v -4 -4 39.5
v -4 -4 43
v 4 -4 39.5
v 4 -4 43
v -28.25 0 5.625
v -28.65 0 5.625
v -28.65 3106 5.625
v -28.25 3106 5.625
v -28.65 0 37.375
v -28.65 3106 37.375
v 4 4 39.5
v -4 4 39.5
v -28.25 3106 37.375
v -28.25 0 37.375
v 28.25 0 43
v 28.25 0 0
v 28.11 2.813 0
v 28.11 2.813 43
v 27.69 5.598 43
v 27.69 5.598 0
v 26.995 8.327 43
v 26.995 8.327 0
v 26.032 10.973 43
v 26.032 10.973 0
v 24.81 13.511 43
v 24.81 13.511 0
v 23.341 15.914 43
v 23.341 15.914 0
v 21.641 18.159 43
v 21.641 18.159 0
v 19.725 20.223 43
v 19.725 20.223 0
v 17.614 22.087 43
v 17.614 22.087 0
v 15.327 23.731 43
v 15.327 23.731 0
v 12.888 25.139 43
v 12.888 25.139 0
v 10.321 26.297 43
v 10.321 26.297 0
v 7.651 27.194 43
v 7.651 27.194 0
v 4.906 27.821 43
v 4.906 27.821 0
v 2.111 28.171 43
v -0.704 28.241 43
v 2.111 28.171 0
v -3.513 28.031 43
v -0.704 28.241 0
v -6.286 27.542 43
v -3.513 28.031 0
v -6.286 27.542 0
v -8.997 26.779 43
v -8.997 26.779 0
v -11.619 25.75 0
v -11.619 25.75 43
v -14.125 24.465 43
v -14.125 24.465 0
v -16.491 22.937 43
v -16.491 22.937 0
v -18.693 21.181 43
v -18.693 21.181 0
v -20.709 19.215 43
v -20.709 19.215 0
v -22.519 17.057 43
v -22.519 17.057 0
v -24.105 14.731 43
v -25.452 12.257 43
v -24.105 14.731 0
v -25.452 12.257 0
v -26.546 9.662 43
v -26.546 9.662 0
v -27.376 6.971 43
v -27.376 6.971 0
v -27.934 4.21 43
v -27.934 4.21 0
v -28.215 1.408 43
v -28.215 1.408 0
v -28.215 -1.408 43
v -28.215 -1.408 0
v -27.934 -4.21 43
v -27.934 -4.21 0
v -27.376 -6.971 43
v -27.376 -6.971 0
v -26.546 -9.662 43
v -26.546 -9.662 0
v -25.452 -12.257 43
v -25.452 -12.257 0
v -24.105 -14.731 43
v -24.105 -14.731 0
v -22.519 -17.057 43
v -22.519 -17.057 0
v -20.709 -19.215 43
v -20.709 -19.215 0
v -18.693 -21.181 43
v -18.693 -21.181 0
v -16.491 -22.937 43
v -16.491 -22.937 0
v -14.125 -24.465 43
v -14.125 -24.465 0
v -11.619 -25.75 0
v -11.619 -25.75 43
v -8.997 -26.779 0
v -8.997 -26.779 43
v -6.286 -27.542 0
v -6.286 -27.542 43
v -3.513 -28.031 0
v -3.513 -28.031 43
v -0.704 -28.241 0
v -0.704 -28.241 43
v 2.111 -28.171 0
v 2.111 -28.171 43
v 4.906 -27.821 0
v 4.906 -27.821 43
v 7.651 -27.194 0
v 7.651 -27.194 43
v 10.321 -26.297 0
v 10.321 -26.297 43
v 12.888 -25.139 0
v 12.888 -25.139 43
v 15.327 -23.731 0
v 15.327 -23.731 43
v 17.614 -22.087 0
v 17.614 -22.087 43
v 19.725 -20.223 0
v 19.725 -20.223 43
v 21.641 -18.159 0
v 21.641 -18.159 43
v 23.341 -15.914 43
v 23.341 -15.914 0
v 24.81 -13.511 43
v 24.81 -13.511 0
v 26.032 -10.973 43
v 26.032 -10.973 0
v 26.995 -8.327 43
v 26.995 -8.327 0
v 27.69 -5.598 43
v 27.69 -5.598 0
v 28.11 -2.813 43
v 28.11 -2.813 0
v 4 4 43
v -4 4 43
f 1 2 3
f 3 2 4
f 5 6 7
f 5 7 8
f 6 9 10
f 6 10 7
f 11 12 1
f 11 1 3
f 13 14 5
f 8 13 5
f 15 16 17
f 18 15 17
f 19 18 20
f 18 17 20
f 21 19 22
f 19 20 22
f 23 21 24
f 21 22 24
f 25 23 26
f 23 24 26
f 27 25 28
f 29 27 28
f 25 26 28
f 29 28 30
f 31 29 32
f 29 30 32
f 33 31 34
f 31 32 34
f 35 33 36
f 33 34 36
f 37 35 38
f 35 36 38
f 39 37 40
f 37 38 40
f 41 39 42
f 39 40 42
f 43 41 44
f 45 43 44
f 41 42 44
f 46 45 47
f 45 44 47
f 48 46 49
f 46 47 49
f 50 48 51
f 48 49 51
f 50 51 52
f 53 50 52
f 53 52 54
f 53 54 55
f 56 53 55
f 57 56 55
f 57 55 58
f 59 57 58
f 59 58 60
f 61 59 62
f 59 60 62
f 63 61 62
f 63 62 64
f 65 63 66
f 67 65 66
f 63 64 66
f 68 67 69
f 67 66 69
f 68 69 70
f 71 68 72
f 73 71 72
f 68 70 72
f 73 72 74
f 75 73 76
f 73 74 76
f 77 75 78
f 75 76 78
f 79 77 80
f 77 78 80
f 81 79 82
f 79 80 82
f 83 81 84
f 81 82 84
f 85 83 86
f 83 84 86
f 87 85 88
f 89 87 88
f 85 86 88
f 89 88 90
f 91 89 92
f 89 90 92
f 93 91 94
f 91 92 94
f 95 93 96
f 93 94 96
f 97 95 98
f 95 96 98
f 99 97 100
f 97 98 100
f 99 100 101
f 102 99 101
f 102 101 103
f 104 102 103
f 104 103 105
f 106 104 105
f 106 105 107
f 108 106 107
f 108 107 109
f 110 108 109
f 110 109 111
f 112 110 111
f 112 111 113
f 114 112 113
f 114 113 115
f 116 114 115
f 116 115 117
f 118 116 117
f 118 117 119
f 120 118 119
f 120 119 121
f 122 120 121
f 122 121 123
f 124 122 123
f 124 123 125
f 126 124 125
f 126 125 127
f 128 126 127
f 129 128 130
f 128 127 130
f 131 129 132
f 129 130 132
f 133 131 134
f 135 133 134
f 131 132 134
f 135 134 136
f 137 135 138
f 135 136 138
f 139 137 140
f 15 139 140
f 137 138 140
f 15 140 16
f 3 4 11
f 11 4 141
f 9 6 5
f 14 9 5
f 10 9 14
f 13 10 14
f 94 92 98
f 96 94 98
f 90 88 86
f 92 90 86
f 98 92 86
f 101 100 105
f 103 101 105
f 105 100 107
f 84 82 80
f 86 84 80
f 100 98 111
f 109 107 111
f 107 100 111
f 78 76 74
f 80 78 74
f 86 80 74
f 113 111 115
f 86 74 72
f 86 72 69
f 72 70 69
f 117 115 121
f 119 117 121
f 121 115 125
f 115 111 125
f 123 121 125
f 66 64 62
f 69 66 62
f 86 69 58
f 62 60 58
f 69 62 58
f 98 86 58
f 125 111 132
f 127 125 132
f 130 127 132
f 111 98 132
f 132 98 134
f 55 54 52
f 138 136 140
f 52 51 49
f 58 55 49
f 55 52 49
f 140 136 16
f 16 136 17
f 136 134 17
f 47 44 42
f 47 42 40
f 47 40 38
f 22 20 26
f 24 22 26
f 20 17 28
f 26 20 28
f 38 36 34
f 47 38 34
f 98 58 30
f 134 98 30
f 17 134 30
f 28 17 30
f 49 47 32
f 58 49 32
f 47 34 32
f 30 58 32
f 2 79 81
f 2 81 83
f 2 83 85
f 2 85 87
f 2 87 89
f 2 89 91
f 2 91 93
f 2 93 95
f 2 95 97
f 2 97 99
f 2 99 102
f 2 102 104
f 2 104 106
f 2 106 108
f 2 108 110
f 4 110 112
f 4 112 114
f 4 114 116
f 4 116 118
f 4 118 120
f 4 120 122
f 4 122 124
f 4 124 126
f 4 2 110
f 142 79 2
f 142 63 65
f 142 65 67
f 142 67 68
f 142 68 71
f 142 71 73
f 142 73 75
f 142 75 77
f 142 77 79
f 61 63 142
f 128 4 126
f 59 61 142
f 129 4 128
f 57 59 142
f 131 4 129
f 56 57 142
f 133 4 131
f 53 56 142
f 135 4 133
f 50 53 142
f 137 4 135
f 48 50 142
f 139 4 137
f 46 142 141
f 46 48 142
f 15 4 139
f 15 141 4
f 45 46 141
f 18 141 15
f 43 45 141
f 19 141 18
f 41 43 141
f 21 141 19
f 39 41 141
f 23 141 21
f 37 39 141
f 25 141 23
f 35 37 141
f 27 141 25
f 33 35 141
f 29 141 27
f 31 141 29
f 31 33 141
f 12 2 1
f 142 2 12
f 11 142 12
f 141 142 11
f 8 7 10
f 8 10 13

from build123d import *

# Parameters (mm, degrees)
SKETCH1_R           = 28.25
BOSS_EXTRUDE1_DEPTH = 43
SKETCH4_W           = 0.4
SKETCH4_H           = 31.75
BOSS_EXTRUDE2_DEPTH = 3106
SKETCH6_W           = 8
SKETCH6_H           = 8
CUT_EXTRUDE1_DEPTH  = 3.5


with BuildPart() as part:
    # Sketch1 → Boss-Extrude1 (new body)
    with BuildSketch(Plane.XY):
        Circle(SKETCH1_R)
    extrude(amount=BOSS_EXTRUDE1_DEPTH)

    # Sketch6 → Cut-Extrude1 (cut)
    with BuildSketch(Plane.XY.offset(43)):
        Rectangle(SKETCH6_W, SKETCH6_H)
    extrude(amount=-CUT_EXTRUDE1_DEPTH, mode=Mode.SUBTRACT)


with BuildPart() as body_2:
    # Sketch4 → Boss-Extrude2 (new body)
    with BuildSketch(Plane(origin=(0, 0, 0), x_dir=(1, 0, 0), z_dir=(0, 1, 0))):
        with Locations((-28.45, -21.5)):
            Rectangle(SKETCH4_W, SKETCH4_H)
    extrude(amount=BOSS_EXTRUDE2_DEPTH)


solid = Compound([part.part, body_2.part])
